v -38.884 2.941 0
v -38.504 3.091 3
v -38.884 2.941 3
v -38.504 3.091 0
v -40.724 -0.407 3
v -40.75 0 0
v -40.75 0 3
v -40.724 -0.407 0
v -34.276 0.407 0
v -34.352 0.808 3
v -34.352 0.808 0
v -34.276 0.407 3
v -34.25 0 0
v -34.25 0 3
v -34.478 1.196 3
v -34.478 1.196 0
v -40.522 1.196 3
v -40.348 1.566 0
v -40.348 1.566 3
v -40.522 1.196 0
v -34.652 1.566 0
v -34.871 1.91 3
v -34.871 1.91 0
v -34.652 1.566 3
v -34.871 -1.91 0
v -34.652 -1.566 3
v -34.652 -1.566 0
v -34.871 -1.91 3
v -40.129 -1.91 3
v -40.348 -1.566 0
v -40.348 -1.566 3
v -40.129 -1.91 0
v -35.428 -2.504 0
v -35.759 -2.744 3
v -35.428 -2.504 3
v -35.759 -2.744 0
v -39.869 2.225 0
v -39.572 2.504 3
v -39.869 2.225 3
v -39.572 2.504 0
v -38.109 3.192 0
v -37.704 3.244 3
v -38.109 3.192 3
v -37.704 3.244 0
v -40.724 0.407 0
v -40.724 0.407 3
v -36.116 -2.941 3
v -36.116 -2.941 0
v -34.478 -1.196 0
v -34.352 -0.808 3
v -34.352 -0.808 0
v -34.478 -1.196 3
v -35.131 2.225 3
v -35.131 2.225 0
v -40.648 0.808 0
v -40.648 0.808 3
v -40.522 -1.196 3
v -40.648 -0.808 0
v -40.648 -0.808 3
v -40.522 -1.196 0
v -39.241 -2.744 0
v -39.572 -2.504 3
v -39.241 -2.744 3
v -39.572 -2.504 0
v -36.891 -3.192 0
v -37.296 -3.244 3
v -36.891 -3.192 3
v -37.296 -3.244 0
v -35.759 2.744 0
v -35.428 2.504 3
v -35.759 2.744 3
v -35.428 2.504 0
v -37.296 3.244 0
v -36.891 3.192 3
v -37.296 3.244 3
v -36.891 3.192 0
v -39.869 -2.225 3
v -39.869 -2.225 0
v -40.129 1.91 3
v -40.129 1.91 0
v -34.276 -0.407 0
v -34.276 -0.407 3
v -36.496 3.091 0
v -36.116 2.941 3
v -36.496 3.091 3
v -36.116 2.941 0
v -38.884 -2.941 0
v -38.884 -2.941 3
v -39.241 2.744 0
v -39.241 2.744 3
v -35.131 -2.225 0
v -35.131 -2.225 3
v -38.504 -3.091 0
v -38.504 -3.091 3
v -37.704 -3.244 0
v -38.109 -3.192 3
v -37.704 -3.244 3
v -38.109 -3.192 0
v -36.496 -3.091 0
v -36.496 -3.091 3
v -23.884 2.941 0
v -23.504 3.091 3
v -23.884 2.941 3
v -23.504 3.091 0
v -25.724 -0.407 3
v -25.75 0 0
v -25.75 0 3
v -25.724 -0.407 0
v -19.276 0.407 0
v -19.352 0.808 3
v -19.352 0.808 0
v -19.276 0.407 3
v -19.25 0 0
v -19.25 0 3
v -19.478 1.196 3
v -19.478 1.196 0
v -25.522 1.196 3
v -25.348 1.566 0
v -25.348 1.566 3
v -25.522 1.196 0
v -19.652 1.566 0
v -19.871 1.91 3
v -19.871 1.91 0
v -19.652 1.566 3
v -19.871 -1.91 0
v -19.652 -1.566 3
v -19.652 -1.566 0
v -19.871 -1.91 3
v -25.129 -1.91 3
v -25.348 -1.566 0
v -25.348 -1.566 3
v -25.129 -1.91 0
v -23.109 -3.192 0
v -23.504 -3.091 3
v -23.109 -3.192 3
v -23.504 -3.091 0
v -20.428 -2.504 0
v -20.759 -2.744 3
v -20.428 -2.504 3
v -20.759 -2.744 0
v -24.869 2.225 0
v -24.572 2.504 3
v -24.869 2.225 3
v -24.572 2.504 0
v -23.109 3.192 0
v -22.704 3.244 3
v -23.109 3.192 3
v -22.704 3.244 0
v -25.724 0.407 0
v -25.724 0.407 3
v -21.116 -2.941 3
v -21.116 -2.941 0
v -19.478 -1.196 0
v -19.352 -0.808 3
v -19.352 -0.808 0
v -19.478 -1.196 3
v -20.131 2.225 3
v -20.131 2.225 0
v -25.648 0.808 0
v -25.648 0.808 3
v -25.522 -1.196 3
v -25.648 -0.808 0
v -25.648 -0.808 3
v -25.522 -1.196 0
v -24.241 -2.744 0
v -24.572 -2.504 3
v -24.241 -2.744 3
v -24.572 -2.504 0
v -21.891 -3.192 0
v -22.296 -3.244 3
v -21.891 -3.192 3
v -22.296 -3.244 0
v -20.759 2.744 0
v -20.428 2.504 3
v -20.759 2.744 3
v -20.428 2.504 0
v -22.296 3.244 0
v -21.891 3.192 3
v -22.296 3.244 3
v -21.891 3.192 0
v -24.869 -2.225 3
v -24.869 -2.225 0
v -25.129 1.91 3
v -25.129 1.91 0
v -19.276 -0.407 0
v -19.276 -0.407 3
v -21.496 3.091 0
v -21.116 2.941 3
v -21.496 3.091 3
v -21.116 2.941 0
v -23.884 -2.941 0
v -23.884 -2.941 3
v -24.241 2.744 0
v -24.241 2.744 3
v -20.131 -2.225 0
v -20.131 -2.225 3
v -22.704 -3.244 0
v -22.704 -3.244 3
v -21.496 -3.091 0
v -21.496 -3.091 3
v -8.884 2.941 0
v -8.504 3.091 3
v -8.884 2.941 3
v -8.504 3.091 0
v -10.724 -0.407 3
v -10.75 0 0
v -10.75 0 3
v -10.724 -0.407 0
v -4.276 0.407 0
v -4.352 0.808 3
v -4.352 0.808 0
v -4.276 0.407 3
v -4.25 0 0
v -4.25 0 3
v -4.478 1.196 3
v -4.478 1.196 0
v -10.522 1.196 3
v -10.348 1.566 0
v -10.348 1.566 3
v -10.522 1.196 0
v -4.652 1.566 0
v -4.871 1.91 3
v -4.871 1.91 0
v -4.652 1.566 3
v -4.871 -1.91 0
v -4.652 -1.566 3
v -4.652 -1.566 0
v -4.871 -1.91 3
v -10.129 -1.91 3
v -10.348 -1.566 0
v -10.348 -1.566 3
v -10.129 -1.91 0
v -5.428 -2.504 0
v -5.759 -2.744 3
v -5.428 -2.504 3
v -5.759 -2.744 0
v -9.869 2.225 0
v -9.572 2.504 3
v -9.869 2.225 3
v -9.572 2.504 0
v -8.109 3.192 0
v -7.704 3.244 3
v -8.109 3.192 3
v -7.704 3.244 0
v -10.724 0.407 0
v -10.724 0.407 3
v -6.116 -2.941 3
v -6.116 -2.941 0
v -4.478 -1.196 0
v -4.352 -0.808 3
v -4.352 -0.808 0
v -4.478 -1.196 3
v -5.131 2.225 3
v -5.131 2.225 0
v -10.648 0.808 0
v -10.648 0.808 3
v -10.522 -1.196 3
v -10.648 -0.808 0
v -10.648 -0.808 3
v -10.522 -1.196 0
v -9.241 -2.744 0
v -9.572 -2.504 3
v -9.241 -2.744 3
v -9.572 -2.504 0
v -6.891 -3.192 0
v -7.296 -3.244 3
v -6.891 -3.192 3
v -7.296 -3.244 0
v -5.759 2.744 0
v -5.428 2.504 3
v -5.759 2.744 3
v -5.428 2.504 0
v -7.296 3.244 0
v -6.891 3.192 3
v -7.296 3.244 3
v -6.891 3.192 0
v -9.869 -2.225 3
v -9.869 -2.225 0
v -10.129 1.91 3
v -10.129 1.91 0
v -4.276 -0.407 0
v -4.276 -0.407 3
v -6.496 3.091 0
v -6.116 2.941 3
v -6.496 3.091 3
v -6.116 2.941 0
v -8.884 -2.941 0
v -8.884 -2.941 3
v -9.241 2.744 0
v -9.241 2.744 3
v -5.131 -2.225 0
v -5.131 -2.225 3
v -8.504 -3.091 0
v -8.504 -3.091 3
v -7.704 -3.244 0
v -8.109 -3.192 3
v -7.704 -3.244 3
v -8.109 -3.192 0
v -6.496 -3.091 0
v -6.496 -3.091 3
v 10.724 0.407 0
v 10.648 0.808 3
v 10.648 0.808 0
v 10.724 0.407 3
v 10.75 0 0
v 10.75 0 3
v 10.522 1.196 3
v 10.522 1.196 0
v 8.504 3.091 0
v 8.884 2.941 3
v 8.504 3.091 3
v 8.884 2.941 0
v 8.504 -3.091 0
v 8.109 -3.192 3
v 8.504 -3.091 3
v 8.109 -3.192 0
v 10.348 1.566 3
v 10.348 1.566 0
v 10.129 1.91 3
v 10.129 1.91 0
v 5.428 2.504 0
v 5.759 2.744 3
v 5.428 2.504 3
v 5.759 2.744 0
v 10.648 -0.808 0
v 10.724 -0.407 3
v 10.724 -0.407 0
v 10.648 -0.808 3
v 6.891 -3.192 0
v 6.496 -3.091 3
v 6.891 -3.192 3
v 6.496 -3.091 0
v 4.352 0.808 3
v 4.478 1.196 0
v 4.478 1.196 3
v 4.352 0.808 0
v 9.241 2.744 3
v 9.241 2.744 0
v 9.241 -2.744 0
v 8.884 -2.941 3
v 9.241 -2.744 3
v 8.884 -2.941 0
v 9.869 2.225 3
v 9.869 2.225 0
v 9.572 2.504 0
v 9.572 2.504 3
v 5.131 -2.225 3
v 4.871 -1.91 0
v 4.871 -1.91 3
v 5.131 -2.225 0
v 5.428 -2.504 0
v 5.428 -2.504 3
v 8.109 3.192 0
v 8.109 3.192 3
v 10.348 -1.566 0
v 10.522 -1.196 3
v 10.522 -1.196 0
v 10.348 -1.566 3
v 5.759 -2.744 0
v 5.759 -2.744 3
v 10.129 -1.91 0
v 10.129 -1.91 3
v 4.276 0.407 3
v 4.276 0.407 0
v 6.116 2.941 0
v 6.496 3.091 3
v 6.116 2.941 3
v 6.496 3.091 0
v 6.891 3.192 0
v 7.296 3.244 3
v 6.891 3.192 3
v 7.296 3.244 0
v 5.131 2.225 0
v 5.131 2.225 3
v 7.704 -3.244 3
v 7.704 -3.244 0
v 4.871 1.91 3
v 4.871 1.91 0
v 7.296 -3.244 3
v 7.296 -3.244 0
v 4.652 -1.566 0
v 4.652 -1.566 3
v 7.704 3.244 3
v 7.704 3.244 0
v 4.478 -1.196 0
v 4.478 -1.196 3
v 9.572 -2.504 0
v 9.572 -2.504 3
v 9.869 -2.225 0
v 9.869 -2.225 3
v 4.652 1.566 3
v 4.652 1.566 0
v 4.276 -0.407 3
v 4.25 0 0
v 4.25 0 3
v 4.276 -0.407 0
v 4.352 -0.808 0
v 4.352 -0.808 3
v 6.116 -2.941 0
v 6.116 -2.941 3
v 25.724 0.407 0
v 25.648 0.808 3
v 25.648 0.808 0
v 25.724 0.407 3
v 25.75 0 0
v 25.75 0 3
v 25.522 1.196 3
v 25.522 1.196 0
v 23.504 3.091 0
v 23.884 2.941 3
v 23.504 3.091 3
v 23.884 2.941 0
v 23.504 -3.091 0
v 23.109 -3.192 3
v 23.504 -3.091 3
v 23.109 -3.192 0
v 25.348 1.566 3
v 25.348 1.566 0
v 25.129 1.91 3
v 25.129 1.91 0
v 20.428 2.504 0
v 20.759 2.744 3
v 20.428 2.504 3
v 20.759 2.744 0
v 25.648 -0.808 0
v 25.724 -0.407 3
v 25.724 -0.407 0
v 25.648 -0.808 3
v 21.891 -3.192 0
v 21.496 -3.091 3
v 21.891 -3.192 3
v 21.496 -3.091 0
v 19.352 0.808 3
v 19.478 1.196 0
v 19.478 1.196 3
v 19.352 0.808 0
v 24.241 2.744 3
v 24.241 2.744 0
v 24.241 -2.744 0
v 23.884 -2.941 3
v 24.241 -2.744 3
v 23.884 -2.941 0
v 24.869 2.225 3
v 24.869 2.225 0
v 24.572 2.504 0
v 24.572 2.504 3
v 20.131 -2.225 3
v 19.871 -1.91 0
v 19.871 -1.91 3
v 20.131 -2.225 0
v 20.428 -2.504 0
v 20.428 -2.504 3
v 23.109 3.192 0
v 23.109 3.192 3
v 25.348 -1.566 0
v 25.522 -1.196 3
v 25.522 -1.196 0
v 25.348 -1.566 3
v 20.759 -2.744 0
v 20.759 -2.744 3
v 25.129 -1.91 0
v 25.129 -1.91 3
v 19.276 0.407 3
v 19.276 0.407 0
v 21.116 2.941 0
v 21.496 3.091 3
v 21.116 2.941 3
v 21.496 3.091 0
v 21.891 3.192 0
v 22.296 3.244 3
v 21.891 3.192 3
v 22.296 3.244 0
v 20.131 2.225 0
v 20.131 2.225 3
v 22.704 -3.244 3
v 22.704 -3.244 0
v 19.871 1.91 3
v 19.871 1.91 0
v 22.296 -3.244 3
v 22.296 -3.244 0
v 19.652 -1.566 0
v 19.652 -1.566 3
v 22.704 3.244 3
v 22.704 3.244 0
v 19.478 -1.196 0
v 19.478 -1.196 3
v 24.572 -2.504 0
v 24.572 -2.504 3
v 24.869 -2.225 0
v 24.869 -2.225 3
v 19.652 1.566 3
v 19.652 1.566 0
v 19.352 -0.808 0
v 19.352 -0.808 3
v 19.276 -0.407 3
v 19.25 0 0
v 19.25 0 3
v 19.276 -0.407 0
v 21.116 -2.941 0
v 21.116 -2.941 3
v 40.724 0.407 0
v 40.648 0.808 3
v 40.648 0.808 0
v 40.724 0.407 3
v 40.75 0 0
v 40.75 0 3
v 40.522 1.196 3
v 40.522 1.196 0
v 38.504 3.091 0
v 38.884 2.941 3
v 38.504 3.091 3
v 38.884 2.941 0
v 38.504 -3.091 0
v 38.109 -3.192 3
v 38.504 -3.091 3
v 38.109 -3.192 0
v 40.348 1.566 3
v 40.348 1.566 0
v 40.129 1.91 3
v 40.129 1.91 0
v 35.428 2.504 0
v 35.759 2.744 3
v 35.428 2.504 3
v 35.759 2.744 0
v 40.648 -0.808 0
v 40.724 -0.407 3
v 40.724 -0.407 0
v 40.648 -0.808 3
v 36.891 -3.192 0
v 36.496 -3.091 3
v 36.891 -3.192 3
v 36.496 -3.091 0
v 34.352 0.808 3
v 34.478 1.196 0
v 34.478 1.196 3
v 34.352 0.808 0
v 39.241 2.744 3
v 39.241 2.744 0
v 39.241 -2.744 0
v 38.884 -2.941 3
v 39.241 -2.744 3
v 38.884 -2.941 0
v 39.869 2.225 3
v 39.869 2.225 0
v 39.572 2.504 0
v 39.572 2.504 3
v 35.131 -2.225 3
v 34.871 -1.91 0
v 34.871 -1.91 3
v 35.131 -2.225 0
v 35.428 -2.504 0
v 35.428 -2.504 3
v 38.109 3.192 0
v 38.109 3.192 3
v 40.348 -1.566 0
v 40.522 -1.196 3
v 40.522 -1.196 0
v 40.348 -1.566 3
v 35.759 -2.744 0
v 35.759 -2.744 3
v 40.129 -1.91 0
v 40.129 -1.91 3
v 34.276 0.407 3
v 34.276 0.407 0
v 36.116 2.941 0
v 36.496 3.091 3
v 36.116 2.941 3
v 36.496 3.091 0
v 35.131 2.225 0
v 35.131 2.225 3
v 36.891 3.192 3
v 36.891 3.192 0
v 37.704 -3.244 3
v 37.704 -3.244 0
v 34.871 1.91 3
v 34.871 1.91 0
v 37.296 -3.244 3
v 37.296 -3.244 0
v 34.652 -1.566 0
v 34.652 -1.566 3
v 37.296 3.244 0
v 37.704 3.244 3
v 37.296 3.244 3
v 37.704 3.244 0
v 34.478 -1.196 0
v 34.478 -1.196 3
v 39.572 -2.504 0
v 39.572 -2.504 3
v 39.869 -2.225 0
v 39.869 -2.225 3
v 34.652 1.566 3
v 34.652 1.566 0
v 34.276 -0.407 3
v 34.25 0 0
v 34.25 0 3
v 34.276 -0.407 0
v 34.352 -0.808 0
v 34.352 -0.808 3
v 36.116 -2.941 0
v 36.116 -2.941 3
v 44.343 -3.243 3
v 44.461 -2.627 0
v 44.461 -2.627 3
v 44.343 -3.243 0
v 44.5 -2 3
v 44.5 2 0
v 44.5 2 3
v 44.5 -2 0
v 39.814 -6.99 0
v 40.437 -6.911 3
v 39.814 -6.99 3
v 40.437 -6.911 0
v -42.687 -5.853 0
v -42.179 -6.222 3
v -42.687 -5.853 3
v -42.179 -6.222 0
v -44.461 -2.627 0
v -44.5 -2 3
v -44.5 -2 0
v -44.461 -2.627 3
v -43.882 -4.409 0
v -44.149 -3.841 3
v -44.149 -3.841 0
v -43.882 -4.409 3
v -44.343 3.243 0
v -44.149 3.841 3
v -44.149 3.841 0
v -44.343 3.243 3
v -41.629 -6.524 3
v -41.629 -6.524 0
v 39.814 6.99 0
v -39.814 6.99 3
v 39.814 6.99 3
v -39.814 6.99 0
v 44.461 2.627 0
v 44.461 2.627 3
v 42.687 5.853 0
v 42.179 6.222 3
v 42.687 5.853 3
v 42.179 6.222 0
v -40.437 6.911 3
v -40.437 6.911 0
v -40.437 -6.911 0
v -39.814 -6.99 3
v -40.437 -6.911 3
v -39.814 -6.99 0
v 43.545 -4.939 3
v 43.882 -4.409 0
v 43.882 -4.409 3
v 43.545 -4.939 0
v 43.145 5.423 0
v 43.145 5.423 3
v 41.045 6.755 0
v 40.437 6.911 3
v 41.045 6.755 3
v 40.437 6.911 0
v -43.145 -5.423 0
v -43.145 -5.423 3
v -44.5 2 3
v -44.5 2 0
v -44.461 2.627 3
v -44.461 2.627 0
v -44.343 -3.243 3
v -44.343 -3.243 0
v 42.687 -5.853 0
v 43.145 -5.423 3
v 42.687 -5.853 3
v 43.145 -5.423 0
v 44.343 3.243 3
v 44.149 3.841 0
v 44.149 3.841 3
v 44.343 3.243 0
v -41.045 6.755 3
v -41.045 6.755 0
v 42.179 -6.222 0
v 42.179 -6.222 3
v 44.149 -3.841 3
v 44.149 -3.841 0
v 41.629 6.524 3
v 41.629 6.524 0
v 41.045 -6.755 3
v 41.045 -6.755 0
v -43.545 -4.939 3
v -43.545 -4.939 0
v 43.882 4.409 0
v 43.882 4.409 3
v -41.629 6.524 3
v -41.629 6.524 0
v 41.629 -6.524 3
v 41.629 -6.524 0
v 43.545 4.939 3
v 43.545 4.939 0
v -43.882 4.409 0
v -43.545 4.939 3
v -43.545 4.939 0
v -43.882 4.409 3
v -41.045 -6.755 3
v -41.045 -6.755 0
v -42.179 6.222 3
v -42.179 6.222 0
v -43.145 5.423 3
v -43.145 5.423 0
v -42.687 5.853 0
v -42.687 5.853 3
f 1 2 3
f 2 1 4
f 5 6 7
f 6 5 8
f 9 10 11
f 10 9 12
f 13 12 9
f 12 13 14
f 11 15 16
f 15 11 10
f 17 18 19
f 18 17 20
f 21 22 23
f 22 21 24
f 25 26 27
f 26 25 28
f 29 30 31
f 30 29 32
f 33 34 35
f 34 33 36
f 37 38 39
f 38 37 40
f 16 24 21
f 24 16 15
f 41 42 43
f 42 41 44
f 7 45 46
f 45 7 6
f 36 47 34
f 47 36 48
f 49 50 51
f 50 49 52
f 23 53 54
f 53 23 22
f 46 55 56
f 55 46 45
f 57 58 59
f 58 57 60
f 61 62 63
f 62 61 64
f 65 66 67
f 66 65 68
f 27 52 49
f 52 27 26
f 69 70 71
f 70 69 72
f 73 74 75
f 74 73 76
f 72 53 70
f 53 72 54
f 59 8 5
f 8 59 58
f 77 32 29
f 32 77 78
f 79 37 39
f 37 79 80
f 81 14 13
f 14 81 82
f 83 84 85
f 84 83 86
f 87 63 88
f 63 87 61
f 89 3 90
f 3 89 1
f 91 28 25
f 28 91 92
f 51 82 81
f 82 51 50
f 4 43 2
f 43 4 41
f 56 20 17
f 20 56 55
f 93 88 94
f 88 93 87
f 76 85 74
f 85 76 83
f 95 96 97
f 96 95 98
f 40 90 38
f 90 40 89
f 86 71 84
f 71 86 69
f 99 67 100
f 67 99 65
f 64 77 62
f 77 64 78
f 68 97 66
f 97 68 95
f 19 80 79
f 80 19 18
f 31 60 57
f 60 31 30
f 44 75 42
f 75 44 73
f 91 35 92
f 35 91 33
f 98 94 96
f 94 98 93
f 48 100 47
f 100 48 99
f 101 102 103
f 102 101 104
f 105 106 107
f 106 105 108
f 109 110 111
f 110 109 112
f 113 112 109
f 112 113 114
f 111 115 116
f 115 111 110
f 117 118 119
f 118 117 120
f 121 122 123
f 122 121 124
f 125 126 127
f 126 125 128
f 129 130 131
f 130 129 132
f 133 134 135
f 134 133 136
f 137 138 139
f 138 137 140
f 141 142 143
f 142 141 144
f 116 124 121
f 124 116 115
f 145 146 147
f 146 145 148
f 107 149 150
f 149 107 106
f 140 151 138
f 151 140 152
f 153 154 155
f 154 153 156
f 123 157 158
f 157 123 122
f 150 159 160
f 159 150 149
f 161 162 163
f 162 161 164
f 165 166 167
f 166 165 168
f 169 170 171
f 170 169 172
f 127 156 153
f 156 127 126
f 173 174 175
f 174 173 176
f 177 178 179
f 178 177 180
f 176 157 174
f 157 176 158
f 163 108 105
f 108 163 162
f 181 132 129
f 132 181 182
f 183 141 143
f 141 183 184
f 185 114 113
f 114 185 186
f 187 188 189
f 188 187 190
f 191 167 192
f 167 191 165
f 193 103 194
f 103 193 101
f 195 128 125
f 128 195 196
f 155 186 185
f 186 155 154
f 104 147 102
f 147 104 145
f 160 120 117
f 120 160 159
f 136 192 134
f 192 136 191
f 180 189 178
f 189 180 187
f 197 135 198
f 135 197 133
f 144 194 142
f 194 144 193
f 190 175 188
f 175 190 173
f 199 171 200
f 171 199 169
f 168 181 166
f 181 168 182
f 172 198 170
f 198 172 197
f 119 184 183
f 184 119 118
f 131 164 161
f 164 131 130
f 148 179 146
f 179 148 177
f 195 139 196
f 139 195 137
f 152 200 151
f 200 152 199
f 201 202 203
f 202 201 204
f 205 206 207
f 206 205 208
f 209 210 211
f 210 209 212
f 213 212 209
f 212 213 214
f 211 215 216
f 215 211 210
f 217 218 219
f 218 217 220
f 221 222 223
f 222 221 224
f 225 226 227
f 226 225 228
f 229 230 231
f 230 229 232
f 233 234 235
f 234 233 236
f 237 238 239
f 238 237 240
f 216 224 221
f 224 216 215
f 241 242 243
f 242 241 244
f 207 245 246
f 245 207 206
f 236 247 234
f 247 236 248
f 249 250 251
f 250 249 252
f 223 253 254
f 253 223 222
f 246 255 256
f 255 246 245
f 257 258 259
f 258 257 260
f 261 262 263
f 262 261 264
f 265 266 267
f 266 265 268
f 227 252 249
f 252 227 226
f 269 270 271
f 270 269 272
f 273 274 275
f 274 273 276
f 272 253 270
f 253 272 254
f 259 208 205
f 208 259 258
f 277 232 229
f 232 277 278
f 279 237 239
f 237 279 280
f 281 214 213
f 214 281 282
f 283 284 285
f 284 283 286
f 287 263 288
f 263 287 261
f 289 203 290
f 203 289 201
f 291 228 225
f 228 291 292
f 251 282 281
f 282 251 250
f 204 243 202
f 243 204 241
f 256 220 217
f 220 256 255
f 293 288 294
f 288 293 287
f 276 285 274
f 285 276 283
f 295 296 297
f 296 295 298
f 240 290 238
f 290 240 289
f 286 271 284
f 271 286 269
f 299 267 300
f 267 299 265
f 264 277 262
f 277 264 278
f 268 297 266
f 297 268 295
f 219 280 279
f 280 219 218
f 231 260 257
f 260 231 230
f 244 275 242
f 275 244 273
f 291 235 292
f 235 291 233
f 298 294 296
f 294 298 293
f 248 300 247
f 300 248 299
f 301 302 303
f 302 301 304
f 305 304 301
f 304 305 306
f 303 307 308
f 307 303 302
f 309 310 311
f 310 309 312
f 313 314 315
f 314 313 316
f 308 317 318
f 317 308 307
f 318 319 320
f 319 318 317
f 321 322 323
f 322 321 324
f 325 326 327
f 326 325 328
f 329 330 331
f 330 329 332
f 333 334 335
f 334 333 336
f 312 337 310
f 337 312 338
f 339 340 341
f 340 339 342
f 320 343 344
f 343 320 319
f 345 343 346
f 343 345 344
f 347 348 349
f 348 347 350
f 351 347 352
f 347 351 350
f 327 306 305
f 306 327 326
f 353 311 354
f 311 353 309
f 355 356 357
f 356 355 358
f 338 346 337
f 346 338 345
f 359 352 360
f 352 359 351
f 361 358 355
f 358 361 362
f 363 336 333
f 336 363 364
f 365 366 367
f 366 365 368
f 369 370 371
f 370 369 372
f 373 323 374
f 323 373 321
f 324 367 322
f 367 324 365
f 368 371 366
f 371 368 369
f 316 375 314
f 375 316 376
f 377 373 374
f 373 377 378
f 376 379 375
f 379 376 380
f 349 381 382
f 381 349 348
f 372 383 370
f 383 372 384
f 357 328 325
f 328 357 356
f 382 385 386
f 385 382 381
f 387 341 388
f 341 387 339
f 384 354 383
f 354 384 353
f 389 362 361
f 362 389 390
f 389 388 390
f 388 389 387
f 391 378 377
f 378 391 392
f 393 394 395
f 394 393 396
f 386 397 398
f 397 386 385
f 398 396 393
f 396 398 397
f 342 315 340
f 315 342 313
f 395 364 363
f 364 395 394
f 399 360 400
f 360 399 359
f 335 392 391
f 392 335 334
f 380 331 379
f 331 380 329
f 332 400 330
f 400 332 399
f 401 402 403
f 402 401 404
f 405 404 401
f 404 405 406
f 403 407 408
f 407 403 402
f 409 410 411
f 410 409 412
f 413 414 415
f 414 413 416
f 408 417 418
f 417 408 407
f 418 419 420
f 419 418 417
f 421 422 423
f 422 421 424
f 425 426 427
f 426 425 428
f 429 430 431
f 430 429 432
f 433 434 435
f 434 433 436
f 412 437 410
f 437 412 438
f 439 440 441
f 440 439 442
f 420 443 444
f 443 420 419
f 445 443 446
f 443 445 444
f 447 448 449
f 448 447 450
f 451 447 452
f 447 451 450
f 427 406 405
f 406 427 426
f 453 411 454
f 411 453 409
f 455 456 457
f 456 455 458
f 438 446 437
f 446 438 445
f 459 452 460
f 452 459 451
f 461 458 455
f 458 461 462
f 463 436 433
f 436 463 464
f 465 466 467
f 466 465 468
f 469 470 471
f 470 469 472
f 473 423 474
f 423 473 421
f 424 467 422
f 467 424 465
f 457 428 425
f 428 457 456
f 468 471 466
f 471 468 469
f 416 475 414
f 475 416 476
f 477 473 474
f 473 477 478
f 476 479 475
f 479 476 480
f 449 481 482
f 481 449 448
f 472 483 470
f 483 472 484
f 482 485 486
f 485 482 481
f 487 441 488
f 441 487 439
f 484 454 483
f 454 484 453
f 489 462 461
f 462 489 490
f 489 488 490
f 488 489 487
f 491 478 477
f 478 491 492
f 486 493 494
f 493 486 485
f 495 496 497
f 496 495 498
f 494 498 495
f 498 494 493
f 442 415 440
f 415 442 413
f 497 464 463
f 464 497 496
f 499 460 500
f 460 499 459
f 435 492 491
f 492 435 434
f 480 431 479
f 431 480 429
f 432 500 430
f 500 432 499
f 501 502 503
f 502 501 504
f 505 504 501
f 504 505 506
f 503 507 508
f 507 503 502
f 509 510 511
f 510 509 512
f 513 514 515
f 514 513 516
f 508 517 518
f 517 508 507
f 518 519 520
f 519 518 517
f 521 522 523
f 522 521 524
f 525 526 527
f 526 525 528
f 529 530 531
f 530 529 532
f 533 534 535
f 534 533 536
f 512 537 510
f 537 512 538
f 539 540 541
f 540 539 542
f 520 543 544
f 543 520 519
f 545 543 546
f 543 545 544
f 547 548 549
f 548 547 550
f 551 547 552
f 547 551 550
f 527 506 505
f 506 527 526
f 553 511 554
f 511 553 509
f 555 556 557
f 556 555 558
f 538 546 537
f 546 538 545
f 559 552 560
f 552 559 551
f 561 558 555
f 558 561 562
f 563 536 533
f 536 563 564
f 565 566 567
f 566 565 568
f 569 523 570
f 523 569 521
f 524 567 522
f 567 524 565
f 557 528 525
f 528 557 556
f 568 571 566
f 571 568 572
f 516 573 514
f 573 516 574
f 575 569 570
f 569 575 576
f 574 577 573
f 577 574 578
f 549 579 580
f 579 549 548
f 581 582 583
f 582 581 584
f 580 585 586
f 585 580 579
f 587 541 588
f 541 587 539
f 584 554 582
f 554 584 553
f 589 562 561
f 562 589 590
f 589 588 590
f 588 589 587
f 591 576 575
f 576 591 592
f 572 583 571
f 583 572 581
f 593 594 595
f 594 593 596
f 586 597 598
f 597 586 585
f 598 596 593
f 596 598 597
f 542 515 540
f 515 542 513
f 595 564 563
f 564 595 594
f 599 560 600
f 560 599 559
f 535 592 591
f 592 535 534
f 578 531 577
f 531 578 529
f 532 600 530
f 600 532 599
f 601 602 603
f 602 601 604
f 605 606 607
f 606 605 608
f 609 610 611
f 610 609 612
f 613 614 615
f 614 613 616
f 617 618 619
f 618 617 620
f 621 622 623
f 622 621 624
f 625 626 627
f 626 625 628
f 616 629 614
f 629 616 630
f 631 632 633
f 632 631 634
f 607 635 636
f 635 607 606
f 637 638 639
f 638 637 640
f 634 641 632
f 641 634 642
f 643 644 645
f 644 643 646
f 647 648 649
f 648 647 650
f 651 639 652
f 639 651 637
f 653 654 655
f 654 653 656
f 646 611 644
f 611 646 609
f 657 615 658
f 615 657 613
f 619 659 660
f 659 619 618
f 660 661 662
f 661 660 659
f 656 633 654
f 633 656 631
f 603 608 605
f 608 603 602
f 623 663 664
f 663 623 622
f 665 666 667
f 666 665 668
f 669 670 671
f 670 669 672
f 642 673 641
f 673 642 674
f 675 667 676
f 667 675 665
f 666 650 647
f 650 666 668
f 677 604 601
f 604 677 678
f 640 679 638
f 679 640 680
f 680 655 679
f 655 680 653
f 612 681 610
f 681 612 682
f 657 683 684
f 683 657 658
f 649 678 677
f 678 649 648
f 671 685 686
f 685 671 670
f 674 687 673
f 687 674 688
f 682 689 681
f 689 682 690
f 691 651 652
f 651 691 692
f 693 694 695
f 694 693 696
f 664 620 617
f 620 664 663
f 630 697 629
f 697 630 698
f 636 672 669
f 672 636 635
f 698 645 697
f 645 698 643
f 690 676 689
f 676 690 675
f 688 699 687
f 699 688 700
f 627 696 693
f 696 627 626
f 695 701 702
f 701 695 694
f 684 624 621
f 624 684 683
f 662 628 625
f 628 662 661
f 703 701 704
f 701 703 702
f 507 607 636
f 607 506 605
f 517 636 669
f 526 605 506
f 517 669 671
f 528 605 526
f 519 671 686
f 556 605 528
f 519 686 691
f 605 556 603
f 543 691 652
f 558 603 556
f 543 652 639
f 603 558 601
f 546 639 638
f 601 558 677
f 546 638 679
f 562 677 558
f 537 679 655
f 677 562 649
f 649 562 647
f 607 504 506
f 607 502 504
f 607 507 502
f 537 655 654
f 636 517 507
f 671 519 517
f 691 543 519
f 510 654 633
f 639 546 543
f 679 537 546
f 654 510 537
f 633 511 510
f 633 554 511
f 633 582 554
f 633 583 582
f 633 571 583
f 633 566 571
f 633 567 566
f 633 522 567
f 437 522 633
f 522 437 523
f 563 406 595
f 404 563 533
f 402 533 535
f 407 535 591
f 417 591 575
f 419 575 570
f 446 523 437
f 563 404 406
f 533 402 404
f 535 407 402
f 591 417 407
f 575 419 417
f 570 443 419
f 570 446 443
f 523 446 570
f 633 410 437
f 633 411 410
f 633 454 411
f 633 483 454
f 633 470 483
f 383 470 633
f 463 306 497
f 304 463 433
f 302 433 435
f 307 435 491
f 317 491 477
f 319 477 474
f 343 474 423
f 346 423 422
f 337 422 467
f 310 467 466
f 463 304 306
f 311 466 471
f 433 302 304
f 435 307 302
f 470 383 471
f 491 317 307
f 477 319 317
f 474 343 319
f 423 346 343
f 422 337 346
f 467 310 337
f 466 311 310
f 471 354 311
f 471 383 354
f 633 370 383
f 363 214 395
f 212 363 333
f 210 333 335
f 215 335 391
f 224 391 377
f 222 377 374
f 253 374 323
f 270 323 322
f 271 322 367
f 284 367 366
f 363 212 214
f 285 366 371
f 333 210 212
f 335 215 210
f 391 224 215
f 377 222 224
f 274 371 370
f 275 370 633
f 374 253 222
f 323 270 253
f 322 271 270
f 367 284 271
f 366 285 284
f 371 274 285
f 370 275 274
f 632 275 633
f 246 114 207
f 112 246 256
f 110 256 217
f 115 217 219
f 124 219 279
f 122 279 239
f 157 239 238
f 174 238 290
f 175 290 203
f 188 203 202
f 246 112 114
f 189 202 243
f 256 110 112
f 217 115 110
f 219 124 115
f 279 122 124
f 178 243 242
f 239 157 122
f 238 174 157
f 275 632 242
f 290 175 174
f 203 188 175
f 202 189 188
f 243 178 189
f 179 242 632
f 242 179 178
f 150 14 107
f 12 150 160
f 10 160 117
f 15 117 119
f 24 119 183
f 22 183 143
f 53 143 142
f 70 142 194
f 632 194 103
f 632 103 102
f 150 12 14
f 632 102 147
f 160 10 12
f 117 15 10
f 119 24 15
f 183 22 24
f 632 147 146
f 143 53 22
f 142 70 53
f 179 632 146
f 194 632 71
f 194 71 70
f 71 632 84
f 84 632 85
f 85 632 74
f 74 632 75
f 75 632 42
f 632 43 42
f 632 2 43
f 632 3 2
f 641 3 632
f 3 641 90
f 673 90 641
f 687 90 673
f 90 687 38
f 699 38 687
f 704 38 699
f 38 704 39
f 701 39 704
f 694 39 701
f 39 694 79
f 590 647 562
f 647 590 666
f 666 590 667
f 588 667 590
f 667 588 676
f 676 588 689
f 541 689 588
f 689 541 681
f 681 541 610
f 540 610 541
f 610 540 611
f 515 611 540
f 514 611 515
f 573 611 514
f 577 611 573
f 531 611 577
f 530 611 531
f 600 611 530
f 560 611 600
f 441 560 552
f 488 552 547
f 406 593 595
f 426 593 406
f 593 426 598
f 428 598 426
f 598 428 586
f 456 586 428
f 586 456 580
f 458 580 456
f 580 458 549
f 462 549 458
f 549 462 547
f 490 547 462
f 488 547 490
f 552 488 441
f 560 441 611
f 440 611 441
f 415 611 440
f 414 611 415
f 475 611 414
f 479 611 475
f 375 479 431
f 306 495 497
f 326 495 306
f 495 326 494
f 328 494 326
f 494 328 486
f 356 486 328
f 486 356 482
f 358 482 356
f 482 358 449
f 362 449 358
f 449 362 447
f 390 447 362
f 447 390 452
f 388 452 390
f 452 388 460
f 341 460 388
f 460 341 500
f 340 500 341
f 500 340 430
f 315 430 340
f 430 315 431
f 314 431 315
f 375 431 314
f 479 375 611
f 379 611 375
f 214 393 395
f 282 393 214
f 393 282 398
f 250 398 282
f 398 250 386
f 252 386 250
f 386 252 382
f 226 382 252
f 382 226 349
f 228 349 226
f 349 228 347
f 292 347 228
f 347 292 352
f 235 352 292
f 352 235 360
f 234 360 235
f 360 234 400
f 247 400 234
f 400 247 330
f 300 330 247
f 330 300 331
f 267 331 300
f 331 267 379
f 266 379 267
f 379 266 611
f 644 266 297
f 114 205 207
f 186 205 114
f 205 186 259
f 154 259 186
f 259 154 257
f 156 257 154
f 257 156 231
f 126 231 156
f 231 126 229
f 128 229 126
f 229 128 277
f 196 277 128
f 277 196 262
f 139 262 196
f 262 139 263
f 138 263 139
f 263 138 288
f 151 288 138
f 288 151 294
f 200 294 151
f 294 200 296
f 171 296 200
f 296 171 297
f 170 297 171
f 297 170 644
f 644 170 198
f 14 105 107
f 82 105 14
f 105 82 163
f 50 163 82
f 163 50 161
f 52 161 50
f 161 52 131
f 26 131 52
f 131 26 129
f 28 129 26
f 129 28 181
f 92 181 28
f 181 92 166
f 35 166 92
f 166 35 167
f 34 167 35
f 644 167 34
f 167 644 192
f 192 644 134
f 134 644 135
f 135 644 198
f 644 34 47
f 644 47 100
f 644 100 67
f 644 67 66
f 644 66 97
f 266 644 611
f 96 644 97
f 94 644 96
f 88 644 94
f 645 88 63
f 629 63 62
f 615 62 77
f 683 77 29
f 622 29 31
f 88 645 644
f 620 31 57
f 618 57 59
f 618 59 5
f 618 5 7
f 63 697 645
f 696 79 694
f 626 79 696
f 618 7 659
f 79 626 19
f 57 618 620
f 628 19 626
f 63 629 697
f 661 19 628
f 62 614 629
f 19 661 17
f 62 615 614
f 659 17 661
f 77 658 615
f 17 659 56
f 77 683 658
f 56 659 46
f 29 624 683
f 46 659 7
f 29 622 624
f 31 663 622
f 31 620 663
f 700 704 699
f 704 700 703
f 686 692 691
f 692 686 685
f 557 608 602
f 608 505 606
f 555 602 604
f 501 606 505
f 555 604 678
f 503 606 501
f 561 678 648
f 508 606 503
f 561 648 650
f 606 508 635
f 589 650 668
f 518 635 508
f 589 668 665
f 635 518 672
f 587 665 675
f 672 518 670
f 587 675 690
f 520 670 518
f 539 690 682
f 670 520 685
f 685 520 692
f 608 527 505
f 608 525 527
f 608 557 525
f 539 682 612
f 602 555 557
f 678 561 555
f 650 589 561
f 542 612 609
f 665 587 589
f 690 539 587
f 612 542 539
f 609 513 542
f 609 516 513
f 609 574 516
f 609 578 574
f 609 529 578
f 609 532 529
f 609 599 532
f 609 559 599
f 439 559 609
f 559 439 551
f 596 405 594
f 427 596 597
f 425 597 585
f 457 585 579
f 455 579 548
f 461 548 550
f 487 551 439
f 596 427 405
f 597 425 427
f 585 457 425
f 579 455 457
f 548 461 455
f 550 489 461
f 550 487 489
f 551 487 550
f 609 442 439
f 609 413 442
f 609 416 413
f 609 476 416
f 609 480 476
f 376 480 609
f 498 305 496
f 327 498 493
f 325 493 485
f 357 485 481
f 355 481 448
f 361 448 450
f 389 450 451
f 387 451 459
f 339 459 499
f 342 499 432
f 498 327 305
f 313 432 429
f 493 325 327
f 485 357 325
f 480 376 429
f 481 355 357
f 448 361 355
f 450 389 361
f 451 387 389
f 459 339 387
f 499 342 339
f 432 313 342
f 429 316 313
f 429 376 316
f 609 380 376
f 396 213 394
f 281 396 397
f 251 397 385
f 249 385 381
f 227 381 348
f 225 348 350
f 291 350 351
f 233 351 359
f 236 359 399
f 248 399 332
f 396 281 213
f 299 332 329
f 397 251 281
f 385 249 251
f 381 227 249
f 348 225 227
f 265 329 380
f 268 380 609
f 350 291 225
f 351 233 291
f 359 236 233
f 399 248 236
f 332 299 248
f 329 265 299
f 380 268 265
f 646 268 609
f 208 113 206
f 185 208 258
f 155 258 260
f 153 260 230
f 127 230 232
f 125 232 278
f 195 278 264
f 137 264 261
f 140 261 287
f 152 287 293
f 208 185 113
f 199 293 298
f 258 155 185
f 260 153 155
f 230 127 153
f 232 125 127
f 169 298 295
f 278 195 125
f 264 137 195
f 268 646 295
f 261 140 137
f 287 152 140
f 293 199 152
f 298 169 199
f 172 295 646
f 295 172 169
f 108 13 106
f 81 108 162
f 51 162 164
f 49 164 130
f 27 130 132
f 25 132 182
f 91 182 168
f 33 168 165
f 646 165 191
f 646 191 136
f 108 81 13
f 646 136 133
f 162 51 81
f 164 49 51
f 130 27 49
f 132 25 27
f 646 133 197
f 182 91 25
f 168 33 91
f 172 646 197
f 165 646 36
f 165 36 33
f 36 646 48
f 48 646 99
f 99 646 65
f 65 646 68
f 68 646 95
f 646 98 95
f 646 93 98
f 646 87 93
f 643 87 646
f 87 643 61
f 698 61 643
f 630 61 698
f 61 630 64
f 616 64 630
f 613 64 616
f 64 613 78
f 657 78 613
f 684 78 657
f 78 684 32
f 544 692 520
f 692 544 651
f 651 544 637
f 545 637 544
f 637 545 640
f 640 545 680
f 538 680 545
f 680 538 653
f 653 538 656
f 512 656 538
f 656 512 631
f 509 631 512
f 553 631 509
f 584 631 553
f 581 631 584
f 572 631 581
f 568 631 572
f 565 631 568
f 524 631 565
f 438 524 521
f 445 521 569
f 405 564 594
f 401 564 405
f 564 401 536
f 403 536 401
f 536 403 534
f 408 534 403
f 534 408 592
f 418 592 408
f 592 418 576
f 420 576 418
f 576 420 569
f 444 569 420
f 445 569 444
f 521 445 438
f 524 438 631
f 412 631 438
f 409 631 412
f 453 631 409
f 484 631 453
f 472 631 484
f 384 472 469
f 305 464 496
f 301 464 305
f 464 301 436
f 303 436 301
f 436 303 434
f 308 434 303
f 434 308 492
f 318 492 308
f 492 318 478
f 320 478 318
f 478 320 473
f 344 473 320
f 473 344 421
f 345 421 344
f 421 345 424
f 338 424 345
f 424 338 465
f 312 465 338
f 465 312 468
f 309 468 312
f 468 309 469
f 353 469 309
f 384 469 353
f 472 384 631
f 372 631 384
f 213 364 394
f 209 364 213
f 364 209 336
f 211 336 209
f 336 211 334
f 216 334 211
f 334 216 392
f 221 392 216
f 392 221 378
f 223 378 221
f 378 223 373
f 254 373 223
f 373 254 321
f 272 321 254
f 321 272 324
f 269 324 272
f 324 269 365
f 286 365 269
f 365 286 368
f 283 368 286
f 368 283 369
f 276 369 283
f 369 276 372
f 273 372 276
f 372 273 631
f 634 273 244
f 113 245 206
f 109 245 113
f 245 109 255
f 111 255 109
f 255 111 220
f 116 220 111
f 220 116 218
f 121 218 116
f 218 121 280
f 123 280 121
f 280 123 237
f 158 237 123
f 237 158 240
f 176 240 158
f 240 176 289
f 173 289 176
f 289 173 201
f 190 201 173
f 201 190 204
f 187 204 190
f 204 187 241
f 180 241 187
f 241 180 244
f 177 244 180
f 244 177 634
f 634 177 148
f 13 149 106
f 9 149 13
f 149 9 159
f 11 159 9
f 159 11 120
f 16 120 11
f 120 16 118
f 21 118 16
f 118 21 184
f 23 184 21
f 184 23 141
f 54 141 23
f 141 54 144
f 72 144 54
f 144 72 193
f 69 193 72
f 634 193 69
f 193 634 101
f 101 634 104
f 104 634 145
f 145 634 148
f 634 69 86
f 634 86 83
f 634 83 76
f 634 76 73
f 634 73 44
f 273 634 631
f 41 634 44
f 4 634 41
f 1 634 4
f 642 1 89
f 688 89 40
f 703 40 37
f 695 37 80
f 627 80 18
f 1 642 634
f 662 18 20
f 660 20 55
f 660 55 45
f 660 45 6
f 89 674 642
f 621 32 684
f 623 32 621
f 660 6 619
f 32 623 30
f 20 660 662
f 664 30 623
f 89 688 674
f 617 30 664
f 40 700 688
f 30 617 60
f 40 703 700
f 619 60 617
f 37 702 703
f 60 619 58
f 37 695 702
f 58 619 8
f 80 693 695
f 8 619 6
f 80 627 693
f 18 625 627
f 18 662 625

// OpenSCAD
$fn = 50;


difference() {
	union() {
		hull() {
			translate(v = [-39.5000000000, 2.0000000000, 0]) {
				cylinder(h = 3, r = 5);
			}
			translate(v = [39.5000000000, 2.0000000000, 0]) {
				cylinder(h = 3, r = 5);
			}
			translate(v = [-39.5000000000, -2.0000000000, 0]) {
				cylinder(h = 3, r = 5);
			}
			translate(v = [39.5000000000, -2.0000000000, 0]) {
				cylinder(h = 3, r = 5);
			}
		}
	}
	union() {
		translate(v = [-37.5000000000, 0.0000000000, 0]) {
			translate(v = [0, 0, -100]) {
				cylinder(h = 200, r = 3.2500000000);
			}
		}
		translate(v = [-22.5000000000, 0.0000000000, 0]) {
			translate(v = [0, 0, -100]) {
				cylinder(h = 200, r = 3.2500000000);
			}
		}
		translate(v = [-7.5000000000, 0.0000000000, 0]) {
			translate(v = [0, 0, -100]) {
				cylinder(h = 200, r = 3.2500000000);
			}
		}
		translate(v = [7.5000000000, 0.0000000000, 0]) {
			translate(v = [0, 0, -100]) {
				cylinder(h = 200, r = 3.2500000000);
			}
		}
		translate(v = [22.5000000000, 0.0000000000, 0]) {
			translate(v = [0, 0, -100]) {
				cylinder(h = 200, r = 3.2500000000);
			}
		}
		translate(v = [37.5000000000, 0.0000000000, 0]) {
			translate(v = [0, 0, -100]) {
				cylinder(h = 200, r = 3.2500000000);
			}
		}
	}
}
